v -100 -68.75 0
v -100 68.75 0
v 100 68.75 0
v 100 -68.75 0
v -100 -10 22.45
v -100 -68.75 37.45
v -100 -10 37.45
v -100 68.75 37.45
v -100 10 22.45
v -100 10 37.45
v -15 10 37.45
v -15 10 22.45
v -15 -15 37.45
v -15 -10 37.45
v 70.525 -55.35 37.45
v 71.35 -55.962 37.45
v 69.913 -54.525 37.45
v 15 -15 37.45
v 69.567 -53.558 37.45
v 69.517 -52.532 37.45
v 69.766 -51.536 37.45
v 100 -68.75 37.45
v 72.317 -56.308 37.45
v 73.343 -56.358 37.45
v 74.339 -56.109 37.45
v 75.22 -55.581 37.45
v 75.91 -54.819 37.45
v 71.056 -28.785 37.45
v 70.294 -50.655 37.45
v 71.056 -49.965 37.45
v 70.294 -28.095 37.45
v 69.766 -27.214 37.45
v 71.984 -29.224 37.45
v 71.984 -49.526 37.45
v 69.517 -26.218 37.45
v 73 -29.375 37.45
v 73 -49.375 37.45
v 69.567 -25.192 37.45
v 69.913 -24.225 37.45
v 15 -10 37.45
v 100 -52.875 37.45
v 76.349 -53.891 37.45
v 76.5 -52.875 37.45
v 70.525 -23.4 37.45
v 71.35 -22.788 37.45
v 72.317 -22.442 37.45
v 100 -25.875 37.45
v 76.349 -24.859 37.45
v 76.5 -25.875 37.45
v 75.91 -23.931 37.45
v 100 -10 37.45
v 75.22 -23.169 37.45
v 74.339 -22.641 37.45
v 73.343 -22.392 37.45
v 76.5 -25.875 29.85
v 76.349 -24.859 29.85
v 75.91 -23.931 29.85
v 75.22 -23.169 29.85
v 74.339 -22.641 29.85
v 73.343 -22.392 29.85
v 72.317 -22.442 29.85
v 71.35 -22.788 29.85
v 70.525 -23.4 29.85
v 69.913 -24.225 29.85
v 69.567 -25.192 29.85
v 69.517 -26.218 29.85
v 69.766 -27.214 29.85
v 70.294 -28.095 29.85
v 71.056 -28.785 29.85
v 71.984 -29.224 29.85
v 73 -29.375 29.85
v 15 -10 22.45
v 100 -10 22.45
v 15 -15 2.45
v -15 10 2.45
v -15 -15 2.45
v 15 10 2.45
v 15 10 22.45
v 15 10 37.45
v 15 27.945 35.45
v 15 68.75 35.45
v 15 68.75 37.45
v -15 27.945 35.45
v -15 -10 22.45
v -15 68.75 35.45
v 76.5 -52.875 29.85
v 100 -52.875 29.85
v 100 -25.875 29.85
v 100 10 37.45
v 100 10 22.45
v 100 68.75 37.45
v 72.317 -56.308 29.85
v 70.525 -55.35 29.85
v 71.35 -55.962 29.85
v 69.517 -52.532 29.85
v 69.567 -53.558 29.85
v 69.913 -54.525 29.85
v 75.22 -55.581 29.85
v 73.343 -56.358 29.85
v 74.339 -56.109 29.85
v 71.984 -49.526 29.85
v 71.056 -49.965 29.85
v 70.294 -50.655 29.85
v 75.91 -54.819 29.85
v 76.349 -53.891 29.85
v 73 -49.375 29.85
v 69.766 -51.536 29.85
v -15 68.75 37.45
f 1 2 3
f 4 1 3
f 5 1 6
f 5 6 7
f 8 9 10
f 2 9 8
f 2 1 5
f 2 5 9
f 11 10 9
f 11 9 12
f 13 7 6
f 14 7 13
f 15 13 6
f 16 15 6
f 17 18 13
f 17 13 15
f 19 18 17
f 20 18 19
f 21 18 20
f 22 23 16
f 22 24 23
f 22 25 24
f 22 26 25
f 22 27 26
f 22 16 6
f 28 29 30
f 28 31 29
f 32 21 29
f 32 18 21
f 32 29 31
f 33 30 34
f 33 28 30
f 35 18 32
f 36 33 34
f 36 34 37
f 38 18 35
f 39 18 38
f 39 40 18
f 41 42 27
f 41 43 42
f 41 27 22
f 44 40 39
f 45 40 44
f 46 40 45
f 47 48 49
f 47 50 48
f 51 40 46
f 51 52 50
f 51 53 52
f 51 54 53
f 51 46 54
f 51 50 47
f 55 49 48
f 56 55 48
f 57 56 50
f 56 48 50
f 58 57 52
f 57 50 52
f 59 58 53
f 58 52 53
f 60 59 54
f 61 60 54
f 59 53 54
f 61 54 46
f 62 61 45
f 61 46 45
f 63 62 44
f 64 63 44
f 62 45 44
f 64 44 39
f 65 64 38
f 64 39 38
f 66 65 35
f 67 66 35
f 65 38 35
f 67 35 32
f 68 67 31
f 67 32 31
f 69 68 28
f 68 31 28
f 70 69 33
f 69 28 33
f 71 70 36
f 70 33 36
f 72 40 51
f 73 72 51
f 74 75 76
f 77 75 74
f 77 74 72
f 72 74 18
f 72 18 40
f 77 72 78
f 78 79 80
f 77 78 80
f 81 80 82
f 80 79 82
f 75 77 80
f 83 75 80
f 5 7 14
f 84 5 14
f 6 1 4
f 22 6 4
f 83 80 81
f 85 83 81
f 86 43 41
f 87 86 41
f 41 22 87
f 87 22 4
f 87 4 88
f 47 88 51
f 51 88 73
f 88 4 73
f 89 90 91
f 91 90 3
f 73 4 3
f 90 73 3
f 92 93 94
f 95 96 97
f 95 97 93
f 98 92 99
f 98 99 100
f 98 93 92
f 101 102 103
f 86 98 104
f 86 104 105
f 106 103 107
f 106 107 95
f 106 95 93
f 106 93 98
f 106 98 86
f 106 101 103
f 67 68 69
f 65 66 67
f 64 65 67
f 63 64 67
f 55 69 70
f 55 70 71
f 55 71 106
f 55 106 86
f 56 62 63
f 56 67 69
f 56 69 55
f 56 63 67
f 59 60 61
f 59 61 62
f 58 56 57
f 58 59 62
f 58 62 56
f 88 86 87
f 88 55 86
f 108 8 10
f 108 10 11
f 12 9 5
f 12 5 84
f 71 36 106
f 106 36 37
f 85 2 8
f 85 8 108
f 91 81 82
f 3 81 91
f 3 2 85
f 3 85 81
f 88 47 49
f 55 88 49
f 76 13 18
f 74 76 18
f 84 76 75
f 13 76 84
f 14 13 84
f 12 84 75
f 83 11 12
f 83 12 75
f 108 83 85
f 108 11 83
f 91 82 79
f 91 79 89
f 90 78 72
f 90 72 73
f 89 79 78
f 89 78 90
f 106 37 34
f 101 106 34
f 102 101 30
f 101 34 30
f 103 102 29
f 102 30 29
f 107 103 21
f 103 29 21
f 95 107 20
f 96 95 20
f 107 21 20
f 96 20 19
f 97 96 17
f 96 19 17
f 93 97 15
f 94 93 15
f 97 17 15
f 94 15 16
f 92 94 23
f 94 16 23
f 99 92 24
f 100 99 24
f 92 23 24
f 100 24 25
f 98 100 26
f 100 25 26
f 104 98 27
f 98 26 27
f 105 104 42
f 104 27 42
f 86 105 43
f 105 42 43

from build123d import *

# Parameters (mm, degrees)
F0_W     = 200
F0_H     = 137.5
F1_DEPTH = 37.45
F2_W     = 200
F2_H     = 20
F3_DEPTH = 15
F4_W     = 30
F4_H     = 5
F5_DEPTH = 35
F7_DEPTH = 15
F9_DEPTH = 7.6


with BuildPart() as f1:
    # F0 (on Top) → F1 (new body)
    with BuildSketch(Plane.XY):
        Rectangle(F0_W, F0_H)
    extrude(amount=F1_DEPTH)

    # F2 (on face) → F3 (cut)
    with BuildSketch(Plane.XY.offset(37.45)):
        Rectangle(F2_W, F2_H)
    extrude(amount=-F3_DEPTH, mode=Mode.SUBTRACT)

    # F4 (on face) → F5 (cut)
    with BuildSketch(Plane.XY.offset(37.45)):
        Polygon((11.49270311, 10), (-11.49270311, 10), (-15, 10), (-15, -10), (15, -10), (15, 10), align=None)
        with Locations((0, -12.5)):
            Rectangle(F4_W, F4_H)
    extrude(amount=-F5_DEPTH, mode=Mode.SUBTRACT)

    # F6 (on Right) → F7 (cut, symmetric)
    with BuildSketch(Plane.YZ):
        Polygon((10, 37.45), (10, 2.45), (27.9449588614, 35.45), (29.0325321257, 37.45), align=None)
        Polygon((29.0325321257, 37.45), (27.9449588614, 35.45), (68.75, 35.45), (68.75, 37.45), align=None)
    extrude(amount=F7_DEPTH, both=True, mode=Mode.SUBTRACT)

    # F8 (on face) → F9 (cut)
    with BuildSketch(Plane.XY.offset(37.45)):
        with BuildLine():
            Line((76.5, -52.875), (100, -52.875))
            Line((100, -52.875), (100, -25.875))
            Line((100, -25.875), (76.5, -25.875))
            ThreePointArc((76.5, -25.875), (75.4748737342, -28.3498737342), (73, -29.375))
            Line((73, -29.375), (73, -49.375))
            ThreePointArc((73, -49.375), (75.4748737342, -50.4001262658), (76.5, -52.875))
        make_face()
        with BuildLine():
            ThreePointArc((73, -49.375), (70.5251262658, -55.3498737342), (76.5, -52.875))
            Line((76.5, -52.875), (73, -52.875))
            Line((73, -52.875), (73, -49.375))
        make_face()
        with BuildLine():
            Line((73, -52.875), (76.5, -52.875))
            ThreePointArc((76.5, -52.875), (75.4748737342, -50.4001262658), (73, -49.375))
            Line((73, -49.375), (73, -52.875))
        make_face()
        with BuildLine():
            ThreePointArc((73, -29.375), (75.4748737342, -28.3498737342), (76.5, -25.875))
            Line((76.5, -25.875), (73, -25.875))
            Line((73, -25.875), (73, -29.375))
        make_face()
        with BuildLine():
            Line((73, -25.875), (76.5, -25.875))
            ThreePointArc((76.5, -25.875), (70.5251262658, -23.4001262658), (73, -29.375))
            Line((73, -29.375), (73, -25.875))
        make_face()
    extrude(amount=-F9_DEPTH, mode=Mode.SUBTRACT)


solid = f1.part
